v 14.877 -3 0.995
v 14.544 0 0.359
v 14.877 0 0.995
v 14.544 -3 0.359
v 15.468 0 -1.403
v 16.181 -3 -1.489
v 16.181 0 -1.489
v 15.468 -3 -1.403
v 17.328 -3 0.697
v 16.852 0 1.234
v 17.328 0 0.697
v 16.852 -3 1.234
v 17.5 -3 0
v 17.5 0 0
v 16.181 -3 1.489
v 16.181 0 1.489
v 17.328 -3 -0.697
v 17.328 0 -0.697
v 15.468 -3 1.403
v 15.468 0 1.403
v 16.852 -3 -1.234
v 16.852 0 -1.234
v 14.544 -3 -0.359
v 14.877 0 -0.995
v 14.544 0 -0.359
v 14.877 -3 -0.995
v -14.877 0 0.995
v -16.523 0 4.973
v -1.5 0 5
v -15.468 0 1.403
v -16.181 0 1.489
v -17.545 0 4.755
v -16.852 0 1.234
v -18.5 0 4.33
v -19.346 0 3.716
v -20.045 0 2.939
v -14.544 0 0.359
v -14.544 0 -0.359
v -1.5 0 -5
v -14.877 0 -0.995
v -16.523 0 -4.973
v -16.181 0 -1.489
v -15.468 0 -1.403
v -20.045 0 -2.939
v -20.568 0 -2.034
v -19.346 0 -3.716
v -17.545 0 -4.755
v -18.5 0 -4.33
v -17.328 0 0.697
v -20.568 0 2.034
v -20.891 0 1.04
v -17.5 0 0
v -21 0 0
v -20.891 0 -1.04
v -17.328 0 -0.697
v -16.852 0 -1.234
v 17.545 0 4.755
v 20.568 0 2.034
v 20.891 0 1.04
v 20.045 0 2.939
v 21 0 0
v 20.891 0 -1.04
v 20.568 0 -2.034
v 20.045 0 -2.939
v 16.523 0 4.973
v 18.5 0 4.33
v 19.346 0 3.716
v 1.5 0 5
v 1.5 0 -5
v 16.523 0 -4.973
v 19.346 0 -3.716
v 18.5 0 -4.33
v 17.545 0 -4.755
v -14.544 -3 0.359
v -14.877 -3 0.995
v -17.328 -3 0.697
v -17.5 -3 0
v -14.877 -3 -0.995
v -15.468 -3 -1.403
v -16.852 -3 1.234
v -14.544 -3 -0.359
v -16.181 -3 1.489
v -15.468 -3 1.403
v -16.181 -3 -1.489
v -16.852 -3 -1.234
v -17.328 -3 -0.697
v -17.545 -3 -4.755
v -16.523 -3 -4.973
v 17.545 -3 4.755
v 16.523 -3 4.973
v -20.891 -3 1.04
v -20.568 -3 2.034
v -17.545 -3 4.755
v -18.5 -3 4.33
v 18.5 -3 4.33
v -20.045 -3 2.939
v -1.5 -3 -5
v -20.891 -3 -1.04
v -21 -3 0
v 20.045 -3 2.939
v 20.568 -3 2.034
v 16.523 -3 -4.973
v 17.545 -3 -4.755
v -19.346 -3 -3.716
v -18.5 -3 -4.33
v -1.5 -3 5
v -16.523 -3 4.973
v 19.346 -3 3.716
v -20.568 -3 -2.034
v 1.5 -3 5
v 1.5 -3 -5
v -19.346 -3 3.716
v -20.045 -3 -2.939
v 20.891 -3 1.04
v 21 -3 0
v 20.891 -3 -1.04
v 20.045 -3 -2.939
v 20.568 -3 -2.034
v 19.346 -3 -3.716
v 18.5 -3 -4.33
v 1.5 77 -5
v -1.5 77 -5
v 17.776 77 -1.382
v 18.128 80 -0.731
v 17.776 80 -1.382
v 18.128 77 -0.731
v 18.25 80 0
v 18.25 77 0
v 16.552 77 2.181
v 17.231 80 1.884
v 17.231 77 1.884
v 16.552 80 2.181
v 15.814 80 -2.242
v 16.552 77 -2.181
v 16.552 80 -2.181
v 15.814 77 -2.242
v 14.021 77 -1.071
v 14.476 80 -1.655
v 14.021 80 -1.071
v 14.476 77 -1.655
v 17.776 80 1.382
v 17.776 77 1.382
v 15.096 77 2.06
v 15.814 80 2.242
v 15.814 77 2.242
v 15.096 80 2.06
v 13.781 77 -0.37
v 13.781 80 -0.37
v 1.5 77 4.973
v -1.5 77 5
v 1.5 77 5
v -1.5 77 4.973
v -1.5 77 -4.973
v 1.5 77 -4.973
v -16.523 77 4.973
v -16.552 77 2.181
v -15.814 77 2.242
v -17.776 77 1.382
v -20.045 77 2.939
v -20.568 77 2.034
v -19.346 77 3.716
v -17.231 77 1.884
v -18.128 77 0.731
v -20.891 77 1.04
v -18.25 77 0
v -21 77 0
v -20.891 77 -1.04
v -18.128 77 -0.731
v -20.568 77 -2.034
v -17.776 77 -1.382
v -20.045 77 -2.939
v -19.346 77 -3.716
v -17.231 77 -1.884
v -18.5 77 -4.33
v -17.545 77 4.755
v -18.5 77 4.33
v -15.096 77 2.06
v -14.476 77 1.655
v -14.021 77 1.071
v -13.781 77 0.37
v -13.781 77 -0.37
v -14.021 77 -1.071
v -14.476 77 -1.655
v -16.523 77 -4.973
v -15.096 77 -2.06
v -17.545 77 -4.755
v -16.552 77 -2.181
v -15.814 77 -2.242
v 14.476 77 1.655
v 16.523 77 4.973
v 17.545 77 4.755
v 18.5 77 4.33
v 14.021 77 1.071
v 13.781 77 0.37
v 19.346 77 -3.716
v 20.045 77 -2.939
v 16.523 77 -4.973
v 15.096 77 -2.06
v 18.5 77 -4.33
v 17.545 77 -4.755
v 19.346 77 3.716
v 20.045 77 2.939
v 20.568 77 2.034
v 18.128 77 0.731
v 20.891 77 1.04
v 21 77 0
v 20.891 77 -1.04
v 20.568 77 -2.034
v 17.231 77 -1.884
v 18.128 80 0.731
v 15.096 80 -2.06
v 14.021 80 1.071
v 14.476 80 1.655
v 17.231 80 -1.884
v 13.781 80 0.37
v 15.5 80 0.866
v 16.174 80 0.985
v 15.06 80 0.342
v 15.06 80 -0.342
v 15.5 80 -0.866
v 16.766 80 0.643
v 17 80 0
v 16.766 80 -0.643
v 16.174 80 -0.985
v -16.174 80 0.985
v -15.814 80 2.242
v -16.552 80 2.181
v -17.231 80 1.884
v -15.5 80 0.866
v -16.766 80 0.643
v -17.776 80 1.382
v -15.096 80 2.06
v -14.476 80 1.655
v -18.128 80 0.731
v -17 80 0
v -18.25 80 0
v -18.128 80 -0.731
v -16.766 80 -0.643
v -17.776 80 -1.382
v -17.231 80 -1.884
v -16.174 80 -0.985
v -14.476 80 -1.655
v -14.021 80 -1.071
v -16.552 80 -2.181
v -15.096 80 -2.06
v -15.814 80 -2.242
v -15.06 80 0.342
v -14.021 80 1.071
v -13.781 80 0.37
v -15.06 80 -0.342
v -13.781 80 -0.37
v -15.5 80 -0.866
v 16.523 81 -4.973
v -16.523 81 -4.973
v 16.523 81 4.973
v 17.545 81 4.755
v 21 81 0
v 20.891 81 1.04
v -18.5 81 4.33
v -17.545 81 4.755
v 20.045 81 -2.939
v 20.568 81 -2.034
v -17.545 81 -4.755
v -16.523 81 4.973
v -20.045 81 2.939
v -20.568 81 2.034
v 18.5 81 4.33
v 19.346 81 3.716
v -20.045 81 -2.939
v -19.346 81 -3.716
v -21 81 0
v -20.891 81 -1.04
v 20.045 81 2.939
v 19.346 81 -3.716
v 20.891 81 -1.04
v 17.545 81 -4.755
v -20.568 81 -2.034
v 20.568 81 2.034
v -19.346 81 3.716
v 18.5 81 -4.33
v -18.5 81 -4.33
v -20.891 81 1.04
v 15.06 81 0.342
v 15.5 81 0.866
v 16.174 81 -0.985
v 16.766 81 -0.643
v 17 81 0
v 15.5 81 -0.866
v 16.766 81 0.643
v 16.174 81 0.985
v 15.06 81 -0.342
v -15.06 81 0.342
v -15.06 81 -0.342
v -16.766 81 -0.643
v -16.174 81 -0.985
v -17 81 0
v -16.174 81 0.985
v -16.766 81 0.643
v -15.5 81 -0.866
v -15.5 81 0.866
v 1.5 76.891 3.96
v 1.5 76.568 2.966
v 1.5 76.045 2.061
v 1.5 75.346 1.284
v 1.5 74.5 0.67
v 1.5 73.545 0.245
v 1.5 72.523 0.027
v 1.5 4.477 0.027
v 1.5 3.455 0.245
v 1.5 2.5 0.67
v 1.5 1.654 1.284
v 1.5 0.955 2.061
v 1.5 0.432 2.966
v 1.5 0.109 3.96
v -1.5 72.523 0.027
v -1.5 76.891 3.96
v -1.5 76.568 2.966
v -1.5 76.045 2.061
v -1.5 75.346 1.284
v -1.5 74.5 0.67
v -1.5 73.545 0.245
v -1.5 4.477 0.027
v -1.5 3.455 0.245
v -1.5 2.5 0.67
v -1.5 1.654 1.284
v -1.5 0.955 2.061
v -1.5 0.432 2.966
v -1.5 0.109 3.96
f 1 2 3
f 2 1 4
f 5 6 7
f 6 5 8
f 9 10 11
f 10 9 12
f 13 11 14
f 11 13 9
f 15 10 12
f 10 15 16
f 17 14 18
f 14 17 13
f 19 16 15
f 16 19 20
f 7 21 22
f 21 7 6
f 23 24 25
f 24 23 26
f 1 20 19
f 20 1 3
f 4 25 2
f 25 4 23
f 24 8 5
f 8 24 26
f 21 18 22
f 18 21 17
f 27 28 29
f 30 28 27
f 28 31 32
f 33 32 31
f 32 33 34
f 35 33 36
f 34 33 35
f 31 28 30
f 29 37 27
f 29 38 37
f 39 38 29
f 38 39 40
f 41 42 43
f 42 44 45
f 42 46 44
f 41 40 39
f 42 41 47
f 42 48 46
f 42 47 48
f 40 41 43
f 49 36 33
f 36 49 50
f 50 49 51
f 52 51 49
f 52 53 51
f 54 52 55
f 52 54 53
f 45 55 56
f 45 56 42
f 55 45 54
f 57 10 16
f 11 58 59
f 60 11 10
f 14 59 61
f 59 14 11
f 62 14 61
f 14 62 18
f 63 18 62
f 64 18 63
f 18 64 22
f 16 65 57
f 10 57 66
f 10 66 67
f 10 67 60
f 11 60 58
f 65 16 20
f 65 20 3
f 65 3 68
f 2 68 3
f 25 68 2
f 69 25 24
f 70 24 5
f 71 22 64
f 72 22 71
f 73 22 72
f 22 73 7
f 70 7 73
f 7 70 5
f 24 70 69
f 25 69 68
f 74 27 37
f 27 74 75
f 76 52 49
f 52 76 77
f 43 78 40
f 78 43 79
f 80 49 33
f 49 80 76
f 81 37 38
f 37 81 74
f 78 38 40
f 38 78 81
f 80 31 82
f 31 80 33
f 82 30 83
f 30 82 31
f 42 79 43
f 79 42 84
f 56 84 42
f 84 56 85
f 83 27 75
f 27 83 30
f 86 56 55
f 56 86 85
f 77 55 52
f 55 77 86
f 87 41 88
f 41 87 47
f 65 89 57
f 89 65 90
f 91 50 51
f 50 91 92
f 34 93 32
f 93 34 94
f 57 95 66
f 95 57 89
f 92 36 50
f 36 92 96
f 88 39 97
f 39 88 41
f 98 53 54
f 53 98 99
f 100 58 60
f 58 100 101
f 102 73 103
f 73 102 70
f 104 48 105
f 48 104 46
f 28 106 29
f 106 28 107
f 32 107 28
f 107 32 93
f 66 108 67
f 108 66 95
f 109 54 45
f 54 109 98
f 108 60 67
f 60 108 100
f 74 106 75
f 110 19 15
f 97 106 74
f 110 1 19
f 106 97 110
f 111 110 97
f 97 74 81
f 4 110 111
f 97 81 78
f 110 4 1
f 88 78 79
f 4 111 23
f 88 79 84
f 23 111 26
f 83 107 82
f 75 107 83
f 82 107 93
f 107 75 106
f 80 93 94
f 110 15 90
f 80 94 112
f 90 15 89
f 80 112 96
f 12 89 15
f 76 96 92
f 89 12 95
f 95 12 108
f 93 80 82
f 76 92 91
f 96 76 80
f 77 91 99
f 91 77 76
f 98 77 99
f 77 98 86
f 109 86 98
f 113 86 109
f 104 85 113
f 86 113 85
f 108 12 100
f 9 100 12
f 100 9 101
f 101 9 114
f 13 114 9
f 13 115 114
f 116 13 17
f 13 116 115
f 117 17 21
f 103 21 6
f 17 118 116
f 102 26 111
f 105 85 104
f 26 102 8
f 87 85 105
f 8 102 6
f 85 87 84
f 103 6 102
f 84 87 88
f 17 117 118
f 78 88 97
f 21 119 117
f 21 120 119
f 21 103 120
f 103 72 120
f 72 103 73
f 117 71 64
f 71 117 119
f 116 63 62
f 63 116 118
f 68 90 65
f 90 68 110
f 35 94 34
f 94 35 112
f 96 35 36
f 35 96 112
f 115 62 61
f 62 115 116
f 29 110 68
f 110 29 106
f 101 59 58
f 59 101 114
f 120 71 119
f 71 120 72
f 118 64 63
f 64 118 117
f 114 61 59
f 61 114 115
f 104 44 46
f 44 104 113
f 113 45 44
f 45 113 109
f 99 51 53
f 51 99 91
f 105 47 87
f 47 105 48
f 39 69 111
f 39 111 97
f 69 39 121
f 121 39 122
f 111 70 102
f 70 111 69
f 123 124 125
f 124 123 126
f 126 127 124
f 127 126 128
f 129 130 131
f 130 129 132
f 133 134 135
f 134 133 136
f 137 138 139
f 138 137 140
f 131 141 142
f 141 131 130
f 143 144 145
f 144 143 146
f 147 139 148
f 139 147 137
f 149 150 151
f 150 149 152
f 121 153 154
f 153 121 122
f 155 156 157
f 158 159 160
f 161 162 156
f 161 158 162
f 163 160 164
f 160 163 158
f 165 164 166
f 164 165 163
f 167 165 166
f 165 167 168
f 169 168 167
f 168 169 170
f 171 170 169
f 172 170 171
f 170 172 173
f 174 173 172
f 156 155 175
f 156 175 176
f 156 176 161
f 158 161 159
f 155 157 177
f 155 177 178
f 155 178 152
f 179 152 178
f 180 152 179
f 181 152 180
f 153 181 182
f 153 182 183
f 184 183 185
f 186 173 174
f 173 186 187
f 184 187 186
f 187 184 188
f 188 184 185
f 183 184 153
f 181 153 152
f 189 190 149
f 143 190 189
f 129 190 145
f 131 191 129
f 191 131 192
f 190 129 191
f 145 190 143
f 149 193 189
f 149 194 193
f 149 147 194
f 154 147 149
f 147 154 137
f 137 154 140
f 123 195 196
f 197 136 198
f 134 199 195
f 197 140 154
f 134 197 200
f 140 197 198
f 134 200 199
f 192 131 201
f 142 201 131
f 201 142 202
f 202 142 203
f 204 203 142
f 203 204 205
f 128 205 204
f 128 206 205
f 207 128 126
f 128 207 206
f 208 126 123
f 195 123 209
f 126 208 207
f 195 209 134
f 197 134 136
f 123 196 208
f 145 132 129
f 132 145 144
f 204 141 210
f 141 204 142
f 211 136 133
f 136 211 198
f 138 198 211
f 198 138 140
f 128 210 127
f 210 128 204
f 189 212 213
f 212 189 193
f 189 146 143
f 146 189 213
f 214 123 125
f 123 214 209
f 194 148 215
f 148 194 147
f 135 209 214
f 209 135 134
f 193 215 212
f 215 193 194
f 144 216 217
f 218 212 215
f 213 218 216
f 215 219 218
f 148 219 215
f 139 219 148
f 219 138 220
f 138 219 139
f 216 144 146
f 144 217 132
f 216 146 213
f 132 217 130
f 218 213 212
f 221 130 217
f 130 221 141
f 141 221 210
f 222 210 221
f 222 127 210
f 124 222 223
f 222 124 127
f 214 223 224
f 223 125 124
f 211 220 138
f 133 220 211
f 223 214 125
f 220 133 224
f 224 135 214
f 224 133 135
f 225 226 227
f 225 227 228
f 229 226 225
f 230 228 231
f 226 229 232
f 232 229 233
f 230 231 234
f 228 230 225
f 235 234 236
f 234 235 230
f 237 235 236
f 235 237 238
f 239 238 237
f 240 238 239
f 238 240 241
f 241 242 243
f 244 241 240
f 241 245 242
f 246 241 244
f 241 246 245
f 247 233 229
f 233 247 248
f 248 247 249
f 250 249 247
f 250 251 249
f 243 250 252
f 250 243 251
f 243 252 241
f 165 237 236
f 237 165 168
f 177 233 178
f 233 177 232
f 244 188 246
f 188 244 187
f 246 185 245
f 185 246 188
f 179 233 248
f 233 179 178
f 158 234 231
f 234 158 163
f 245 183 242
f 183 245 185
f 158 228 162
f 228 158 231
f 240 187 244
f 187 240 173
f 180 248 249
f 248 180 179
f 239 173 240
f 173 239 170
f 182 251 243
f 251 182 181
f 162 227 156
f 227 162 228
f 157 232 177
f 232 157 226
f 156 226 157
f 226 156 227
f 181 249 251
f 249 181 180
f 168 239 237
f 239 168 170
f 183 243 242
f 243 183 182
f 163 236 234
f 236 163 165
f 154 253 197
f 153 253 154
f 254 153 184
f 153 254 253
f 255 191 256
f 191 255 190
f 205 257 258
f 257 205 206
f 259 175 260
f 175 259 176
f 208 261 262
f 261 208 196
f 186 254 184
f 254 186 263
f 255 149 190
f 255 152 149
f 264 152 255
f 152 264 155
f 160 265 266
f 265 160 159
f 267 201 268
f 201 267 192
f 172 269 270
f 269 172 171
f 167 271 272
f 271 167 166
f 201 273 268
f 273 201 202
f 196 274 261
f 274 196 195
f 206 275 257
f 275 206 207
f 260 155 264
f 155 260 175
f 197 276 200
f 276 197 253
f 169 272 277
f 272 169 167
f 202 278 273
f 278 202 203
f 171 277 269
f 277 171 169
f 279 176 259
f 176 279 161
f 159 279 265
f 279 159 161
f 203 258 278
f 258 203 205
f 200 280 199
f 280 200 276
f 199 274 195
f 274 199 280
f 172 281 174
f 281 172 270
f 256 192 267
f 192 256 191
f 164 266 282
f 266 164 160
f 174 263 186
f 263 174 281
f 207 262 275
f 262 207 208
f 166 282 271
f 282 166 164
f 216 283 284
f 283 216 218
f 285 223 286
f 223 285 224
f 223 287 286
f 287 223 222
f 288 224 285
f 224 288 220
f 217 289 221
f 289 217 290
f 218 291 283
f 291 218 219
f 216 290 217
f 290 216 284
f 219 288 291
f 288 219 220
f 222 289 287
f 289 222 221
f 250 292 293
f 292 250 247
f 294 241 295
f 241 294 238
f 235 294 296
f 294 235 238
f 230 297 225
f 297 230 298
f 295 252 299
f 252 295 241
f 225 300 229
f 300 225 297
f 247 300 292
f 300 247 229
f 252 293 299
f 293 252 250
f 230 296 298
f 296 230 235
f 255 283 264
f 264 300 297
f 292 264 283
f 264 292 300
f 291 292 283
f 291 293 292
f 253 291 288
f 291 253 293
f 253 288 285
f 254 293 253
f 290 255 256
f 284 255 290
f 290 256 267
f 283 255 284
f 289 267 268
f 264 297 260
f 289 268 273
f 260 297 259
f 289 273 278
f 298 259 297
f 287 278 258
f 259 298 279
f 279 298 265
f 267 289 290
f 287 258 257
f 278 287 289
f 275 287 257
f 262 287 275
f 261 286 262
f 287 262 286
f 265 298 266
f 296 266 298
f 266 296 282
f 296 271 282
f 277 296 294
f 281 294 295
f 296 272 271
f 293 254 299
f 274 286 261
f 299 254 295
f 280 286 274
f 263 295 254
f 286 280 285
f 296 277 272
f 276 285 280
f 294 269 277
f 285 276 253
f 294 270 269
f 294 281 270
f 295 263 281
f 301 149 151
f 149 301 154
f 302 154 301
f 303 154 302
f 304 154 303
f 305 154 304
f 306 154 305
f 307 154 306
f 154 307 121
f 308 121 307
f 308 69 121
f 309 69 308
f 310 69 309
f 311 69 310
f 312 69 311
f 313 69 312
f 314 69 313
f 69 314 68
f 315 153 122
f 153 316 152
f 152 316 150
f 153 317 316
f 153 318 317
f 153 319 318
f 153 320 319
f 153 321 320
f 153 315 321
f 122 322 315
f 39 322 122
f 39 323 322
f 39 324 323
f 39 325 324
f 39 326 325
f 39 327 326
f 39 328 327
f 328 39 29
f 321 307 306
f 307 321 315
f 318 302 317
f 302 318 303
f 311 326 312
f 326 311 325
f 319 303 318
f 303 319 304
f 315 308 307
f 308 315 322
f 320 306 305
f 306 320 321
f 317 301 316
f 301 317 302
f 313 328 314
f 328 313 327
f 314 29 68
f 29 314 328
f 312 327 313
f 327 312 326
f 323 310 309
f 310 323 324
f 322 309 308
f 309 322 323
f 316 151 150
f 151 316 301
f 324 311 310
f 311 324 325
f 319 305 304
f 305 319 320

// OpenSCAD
$fs=.75;

union() {
	rotate(a = [90, 0, 0]) {
		difference() {
			hull() {
				translate(v = [16.0000000000, 0, 0]) {
					cylinder(d = 10.0000000000, h = 3);
				}
				translate(v = [-16.0000000000, 0, 0]) {
					cylinder(d = 10.0000000000, h = 3);
				}
				translate(v = [0, 0.0000000000, 1.5000000000]) {
					translate(v = [-1.5000000000, -5.0000000000, -1.5000000000]) {
						cube(size = [3, 10.0000000000, 3]);
					}
				}
			}
			union() {
				translate(v = [16, 0, 0]) {
					cylinder(d = 3.0000000000, h = 4);
				}
				mirror(v = [1, 0, 0]) {
					translate(v = [16, 0, 0]) {
						cylinder(d = 3.0000000000, h = 4);
					}
				}
			}
		}
	}
	translate(v = [0, 77.0000000000, 0]) {
		union() {
			rotate(a = [-90, 0, 0]) {
				difference() {
					hull() {
						translate(v = [-16.0000000000, 0, 0]) {
							cylinder(d = 10.0000000000, h = 3);
						}
						translate(v = [16.0000000000, 0, 0]) {
							cylinder(d = 10.0000000000, h = 3);
						}
					}
					union() {
						translate(v = [16, 0, 0]) {
							cylinder(d = 4.5000000000, h = 3);
						}
						mirror(v = [1, 0, 0]) {
							translate(v = [16, 0, 0]) {
								cylinder(d = 4.5000000000, h = 3);
							}
						}
					}
				}
			}
			translate(v = [0, 3, 0]) {
				rotate(a = [-90, 0, 0]) {
					difference() {
						hull() {
							translate(v = [-16.0000000000, 0, 0]) {
								cylinder(d = 10.0000000000, h = 1);
							}
							translate(v = [16.0000000000, 0, 0]) {
								cylinder(d = 10.0000000000, h = 1);
							}
						}
						union() {
							translate(v = [16, 0, 0]) {
								cylinder(d = 2, h = 3);
							}
							mirror(v = [1, 0, 0]) {
								translate(v = [16, 0, 0]) {
									cylinder(d = 2, h = 3);
								}
							}
						}
					}
				}
			}
		}
	}
	difference() {
		translate(v = [0, 38.5000000000, 0.0000000000]) {
			translate(v = [-1.5000000000, -38.5000000000, -5.0000000000]) {
				cube(size = [3, 77.0000000000, 10.0000000000]);
			}
		}
		translate(v = [-2, 38.5000000000, 5.0000000000]) {
			rotate(a = [90, 0, 90]) {
				hull() {
					translate(v = [-33.5000000000, 0, 0]) {
						cylinder(d = 10.0000000000, h = 6);
					}
					translate(v = [33.5000000000, 0, 0]) {
						cylinder(d = 10.0000000000, h = 6);
					}
				}
			}
		}
	}
}
/***********************************************
*********      SolidPython code:      **********
************************************************
 
from solid import *
from solid import extensions
from math import *

class Object:
    pass

w = 32
l = 12*3+23+6+4+8.
screw = 3.0
shaftD = 4.5
thk=3
h=10.

def washer(r1,r0,h=1):
	return cylinder(r=r1,h=h)-cylinder(r=r0,h=h).set_hole()

def rbeam(w,l,thk):
	return hull(cylinder(d=w,h=thk).move(x=-l/2.),
	     	     cylinder(d=w,h=thk).move(x=l/2.))

beam1 = (hull(cylinder(d=h,h=thk).move(x=w/2.), cylinder(d=h,h=thk).move(x=-w/2.), cube([thk,h,thk]).align('z-'))
	     - cylinder(d=screw,h=thk+1).move(x=w/2).mirrorCopy('x')
	    ).rot(x=90)

beam2 = ( rbeam(h,w,thk)
	     - cylinder(d=shaftD,h=thk).move(x=w/2).mirrorCopy('x')
	    ).rot(x=-90)

beam2_1 = ( rbeam(h,w,1)
	     - cylinder(d=2,h=thk).move(x=w/2).mirrorCopy('x')).rot(x=-90).move(y=thk)

middleBar = ( cube([thk,l,h]).align('y-')
	          -rbeam(h,l-h,thk*2).rot(x=90,z=90).move(x=-thk/2,y=l/2,z=h/2))
scene = beam1+(beam2+beam2_1).move(y=l)+middleBar
scad_render_to_file(scene, 'preview.scad', '$fs=.75;')
 
 
************************************************/
